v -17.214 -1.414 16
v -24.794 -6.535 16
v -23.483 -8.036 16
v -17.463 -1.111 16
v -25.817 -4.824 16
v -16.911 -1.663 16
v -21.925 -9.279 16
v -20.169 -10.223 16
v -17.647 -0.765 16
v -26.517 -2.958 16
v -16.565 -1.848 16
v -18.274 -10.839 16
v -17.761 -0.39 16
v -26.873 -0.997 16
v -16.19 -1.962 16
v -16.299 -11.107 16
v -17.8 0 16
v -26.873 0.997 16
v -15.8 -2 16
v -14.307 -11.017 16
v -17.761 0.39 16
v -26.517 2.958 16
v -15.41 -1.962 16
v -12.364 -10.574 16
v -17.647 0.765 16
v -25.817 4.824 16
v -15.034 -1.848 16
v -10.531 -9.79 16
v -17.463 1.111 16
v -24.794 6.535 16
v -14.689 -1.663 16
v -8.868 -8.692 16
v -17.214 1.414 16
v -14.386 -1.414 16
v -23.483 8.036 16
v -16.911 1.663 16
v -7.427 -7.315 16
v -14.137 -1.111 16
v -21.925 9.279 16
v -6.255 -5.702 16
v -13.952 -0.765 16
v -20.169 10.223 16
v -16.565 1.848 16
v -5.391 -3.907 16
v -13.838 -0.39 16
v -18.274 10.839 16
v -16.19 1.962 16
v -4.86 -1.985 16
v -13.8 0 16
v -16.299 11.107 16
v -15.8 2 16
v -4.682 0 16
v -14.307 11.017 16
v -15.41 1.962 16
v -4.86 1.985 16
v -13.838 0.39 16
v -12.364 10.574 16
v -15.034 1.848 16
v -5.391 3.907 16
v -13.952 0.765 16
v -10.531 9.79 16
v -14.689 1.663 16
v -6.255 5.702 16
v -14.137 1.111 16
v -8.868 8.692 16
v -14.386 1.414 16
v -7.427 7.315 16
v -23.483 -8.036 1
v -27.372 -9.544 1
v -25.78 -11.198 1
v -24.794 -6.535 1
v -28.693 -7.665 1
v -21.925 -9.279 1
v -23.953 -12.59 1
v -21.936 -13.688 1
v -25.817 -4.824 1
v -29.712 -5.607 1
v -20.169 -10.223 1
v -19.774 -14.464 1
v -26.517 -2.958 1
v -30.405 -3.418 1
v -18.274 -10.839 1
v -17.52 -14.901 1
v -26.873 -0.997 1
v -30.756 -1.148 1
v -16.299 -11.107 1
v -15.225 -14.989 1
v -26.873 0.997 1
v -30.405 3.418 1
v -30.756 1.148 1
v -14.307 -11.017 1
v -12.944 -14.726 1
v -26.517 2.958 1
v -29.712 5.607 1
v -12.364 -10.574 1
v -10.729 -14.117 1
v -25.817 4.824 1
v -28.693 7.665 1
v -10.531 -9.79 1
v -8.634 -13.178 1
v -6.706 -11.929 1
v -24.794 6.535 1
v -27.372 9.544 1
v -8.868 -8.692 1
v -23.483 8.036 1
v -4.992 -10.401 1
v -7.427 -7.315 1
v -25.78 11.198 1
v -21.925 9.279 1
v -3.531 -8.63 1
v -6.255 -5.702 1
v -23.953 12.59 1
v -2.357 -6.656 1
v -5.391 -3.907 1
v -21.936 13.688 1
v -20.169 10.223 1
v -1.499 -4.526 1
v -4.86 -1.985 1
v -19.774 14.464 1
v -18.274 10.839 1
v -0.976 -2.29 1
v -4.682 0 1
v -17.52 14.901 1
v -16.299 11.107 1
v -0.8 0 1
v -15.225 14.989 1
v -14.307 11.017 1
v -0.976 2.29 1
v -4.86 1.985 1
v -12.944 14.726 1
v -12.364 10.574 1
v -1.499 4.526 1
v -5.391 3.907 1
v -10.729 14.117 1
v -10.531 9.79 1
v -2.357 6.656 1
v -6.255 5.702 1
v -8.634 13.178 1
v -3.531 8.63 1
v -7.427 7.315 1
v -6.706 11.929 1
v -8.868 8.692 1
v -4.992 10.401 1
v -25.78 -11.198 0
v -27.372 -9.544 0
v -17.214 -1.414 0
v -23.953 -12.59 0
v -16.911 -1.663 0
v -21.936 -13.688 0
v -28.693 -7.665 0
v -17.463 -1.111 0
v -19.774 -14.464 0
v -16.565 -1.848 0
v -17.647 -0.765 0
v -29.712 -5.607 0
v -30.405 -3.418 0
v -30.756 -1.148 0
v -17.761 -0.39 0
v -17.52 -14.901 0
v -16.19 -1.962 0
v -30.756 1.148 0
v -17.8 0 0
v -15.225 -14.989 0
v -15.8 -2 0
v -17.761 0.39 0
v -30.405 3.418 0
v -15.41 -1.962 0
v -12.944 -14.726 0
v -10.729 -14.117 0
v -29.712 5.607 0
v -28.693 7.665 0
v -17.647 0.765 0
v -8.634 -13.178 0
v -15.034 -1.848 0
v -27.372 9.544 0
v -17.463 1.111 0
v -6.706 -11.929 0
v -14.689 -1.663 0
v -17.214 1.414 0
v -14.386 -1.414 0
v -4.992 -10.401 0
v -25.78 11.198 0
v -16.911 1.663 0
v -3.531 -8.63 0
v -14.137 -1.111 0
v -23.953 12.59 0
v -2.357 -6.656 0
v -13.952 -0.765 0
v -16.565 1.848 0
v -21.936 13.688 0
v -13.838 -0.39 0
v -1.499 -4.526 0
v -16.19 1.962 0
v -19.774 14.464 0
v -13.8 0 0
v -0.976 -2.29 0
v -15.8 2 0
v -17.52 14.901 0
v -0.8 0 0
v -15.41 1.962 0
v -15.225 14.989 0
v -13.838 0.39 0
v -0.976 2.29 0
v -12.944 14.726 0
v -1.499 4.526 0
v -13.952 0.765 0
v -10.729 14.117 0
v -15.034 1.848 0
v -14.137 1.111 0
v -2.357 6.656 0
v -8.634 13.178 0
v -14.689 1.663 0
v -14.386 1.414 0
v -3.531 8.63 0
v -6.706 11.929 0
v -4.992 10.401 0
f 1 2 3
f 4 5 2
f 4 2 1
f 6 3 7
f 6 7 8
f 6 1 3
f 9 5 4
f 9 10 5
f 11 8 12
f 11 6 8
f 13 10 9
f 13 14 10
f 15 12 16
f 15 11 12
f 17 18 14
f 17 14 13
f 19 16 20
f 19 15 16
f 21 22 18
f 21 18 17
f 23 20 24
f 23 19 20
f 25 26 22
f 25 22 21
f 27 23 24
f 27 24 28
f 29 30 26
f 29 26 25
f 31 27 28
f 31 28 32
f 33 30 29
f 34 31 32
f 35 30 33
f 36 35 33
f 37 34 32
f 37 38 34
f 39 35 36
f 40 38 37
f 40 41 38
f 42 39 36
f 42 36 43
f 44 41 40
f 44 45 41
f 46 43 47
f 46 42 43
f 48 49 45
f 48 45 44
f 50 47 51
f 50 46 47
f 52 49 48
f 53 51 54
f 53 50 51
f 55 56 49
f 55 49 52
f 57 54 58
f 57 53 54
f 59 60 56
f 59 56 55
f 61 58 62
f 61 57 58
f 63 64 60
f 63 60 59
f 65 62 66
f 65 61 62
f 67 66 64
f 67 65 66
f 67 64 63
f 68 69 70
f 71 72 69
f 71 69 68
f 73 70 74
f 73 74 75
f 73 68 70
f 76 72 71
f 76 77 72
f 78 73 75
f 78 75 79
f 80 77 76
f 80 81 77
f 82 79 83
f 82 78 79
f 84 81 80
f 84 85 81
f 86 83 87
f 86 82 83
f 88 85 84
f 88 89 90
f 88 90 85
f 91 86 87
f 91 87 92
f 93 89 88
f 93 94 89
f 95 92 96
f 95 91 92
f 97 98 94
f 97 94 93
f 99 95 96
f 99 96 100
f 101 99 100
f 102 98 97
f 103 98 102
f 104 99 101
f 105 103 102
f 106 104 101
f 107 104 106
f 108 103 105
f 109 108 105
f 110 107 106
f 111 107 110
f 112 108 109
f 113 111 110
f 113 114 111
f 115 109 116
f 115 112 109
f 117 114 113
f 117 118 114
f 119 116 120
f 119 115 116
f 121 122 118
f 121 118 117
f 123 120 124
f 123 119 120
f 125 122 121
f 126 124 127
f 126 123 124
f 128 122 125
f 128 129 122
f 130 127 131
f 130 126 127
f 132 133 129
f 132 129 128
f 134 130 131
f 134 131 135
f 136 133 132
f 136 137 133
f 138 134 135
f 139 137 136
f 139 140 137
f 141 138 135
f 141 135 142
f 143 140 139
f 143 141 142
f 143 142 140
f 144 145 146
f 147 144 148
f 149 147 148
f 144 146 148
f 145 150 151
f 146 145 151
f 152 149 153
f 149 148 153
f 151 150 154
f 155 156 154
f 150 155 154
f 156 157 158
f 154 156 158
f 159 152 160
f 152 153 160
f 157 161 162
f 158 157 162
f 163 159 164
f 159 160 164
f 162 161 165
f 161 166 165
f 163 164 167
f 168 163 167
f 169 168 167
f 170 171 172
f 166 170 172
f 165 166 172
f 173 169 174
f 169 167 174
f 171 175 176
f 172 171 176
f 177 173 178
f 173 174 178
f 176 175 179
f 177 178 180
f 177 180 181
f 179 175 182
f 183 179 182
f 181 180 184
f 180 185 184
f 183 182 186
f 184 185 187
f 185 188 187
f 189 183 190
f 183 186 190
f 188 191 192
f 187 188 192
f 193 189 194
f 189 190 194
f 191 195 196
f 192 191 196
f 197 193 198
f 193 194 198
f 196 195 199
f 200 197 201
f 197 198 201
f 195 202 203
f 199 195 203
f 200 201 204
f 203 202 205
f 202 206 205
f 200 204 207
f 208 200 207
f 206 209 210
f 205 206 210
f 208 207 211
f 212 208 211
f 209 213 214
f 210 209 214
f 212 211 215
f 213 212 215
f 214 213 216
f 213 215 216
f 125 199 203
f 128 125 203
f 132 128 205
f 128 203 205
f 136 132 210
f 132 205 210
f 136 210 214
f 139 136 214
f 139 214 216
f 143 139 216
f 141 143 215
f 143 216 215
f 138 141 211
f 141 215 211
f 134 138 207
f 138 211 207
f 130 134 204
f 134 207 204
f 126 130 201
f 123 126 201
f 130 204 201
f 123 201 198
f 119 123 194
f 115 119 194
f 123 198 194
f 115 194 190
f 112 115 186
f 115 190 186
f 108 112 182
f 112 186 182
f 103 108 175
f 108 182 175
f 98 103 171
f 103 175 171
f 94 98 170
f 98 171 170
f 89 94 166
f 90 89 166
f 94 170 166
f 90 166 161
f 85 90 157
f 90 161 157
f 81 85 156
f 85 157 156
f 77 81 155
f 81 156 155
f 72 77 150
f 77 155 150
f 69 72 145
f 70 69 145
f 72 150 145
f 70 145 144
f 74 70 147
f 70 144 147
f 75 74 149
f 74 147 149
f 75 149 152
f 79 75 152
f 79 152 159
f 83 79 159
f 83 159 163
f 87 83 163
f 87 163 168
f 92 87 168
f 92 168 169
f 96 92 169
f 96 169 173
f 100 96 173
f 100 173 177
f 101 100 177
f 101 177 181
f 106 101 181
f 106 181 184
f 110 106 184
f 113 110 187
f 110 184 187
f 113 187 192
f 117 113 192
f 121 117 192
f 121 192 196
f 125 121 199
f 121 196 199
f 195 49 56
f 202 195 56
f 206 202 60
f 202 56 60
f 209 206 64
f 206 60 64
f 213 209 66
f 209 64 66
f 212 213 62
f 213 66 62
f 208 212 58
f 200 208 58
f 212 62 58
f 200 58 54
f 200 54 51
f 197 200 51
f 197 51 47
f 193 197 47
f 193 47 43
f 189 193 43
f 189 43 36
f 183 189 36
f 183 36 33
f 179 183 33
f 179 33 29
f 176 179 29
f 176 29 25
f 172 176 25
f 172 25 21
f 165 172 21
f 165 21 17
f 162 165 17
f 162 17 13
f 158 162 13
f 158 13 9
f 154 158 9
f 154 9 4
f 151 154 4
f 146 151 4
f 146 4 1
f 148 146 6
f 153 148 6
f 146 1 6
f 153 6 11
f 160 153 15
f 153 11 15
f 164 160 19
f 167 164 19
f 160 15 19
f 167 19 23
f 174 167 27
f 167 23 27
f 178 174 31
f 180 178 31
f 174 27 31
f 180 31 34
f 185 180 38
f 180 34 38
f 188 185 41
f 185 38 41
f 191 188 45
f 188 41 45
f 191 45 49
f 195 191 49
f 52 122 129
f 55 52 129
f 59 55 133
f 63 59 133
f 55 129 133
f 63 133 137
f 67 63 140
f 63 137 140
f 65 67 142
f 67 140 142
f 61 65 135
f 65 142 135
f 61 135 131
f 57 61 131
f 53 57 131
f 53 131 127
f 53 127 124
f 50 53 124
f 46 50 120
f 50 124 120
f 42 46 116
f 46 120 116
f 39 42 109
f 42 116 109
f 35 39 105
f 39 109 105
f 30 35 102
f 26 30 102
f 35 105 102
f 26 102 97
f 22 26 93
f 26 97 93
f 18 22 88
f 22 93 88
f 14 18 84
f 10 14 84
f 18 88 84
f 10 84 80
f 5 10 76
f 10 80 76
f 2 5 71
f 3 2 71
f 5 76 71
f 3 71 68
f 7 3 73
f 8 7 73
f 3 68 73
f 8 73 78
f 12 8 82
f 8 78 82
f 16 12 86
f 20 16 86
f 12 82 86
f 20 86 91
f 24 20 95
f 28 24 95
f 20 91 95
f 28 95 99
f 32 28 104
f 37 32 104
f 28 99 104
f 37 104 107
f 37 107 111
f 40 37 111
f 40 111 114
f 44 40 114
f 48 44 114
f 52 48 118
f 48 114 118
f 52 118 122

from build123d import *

# Parameters (mm, degrees)
IZIM1_R                     = 15
Y_KSEKLIK_EKSTR_ZYON1_DEPTH = 1
IZIM2_R                     = 11.118013459
Y_KSEKLIK_EKSTR_ZYON2_DEPTH = 15
IZIM3_R                     = 2
KES_EKSTR_ZYON1_DEPTH       = 38.810359459


with BuildPart() as part:
    # Çizim1 → Yükseklik-Ekstrüzyon1 (new body)
    with BuildSketch(Plane.XY):
        with Locations((-15.799728609, 0)):
            Circle(IZIM1_R)
    extrude(amount=Y_KSEKLIK_EKSTR_ZYON1_DEPTH)

    # Çizim2 → Yükseklik-Ekstrüzyon2 (add)
    with BuildSketch(Plane.XY.offset(1)):
        with Locations((-15.799728609, 0)):
            Circle(IZIM2_R)
    extrude(amount=Y_KSEKLIK_EKSTR_ZYON2_DEPTH)

    # Çizim3 → Kes-Ekstrüzyon1 (cut, through all)
    with BuildSketch(Plane.XY.offset(16)):
        with Locations((-15.799728609, 0)):
            Circle(IZIM3_R)
    extrude(amount=-KES_EKSTR_ZYON1_DEPTH, mode=Mode.SUBTRACT)


solid = part.part
